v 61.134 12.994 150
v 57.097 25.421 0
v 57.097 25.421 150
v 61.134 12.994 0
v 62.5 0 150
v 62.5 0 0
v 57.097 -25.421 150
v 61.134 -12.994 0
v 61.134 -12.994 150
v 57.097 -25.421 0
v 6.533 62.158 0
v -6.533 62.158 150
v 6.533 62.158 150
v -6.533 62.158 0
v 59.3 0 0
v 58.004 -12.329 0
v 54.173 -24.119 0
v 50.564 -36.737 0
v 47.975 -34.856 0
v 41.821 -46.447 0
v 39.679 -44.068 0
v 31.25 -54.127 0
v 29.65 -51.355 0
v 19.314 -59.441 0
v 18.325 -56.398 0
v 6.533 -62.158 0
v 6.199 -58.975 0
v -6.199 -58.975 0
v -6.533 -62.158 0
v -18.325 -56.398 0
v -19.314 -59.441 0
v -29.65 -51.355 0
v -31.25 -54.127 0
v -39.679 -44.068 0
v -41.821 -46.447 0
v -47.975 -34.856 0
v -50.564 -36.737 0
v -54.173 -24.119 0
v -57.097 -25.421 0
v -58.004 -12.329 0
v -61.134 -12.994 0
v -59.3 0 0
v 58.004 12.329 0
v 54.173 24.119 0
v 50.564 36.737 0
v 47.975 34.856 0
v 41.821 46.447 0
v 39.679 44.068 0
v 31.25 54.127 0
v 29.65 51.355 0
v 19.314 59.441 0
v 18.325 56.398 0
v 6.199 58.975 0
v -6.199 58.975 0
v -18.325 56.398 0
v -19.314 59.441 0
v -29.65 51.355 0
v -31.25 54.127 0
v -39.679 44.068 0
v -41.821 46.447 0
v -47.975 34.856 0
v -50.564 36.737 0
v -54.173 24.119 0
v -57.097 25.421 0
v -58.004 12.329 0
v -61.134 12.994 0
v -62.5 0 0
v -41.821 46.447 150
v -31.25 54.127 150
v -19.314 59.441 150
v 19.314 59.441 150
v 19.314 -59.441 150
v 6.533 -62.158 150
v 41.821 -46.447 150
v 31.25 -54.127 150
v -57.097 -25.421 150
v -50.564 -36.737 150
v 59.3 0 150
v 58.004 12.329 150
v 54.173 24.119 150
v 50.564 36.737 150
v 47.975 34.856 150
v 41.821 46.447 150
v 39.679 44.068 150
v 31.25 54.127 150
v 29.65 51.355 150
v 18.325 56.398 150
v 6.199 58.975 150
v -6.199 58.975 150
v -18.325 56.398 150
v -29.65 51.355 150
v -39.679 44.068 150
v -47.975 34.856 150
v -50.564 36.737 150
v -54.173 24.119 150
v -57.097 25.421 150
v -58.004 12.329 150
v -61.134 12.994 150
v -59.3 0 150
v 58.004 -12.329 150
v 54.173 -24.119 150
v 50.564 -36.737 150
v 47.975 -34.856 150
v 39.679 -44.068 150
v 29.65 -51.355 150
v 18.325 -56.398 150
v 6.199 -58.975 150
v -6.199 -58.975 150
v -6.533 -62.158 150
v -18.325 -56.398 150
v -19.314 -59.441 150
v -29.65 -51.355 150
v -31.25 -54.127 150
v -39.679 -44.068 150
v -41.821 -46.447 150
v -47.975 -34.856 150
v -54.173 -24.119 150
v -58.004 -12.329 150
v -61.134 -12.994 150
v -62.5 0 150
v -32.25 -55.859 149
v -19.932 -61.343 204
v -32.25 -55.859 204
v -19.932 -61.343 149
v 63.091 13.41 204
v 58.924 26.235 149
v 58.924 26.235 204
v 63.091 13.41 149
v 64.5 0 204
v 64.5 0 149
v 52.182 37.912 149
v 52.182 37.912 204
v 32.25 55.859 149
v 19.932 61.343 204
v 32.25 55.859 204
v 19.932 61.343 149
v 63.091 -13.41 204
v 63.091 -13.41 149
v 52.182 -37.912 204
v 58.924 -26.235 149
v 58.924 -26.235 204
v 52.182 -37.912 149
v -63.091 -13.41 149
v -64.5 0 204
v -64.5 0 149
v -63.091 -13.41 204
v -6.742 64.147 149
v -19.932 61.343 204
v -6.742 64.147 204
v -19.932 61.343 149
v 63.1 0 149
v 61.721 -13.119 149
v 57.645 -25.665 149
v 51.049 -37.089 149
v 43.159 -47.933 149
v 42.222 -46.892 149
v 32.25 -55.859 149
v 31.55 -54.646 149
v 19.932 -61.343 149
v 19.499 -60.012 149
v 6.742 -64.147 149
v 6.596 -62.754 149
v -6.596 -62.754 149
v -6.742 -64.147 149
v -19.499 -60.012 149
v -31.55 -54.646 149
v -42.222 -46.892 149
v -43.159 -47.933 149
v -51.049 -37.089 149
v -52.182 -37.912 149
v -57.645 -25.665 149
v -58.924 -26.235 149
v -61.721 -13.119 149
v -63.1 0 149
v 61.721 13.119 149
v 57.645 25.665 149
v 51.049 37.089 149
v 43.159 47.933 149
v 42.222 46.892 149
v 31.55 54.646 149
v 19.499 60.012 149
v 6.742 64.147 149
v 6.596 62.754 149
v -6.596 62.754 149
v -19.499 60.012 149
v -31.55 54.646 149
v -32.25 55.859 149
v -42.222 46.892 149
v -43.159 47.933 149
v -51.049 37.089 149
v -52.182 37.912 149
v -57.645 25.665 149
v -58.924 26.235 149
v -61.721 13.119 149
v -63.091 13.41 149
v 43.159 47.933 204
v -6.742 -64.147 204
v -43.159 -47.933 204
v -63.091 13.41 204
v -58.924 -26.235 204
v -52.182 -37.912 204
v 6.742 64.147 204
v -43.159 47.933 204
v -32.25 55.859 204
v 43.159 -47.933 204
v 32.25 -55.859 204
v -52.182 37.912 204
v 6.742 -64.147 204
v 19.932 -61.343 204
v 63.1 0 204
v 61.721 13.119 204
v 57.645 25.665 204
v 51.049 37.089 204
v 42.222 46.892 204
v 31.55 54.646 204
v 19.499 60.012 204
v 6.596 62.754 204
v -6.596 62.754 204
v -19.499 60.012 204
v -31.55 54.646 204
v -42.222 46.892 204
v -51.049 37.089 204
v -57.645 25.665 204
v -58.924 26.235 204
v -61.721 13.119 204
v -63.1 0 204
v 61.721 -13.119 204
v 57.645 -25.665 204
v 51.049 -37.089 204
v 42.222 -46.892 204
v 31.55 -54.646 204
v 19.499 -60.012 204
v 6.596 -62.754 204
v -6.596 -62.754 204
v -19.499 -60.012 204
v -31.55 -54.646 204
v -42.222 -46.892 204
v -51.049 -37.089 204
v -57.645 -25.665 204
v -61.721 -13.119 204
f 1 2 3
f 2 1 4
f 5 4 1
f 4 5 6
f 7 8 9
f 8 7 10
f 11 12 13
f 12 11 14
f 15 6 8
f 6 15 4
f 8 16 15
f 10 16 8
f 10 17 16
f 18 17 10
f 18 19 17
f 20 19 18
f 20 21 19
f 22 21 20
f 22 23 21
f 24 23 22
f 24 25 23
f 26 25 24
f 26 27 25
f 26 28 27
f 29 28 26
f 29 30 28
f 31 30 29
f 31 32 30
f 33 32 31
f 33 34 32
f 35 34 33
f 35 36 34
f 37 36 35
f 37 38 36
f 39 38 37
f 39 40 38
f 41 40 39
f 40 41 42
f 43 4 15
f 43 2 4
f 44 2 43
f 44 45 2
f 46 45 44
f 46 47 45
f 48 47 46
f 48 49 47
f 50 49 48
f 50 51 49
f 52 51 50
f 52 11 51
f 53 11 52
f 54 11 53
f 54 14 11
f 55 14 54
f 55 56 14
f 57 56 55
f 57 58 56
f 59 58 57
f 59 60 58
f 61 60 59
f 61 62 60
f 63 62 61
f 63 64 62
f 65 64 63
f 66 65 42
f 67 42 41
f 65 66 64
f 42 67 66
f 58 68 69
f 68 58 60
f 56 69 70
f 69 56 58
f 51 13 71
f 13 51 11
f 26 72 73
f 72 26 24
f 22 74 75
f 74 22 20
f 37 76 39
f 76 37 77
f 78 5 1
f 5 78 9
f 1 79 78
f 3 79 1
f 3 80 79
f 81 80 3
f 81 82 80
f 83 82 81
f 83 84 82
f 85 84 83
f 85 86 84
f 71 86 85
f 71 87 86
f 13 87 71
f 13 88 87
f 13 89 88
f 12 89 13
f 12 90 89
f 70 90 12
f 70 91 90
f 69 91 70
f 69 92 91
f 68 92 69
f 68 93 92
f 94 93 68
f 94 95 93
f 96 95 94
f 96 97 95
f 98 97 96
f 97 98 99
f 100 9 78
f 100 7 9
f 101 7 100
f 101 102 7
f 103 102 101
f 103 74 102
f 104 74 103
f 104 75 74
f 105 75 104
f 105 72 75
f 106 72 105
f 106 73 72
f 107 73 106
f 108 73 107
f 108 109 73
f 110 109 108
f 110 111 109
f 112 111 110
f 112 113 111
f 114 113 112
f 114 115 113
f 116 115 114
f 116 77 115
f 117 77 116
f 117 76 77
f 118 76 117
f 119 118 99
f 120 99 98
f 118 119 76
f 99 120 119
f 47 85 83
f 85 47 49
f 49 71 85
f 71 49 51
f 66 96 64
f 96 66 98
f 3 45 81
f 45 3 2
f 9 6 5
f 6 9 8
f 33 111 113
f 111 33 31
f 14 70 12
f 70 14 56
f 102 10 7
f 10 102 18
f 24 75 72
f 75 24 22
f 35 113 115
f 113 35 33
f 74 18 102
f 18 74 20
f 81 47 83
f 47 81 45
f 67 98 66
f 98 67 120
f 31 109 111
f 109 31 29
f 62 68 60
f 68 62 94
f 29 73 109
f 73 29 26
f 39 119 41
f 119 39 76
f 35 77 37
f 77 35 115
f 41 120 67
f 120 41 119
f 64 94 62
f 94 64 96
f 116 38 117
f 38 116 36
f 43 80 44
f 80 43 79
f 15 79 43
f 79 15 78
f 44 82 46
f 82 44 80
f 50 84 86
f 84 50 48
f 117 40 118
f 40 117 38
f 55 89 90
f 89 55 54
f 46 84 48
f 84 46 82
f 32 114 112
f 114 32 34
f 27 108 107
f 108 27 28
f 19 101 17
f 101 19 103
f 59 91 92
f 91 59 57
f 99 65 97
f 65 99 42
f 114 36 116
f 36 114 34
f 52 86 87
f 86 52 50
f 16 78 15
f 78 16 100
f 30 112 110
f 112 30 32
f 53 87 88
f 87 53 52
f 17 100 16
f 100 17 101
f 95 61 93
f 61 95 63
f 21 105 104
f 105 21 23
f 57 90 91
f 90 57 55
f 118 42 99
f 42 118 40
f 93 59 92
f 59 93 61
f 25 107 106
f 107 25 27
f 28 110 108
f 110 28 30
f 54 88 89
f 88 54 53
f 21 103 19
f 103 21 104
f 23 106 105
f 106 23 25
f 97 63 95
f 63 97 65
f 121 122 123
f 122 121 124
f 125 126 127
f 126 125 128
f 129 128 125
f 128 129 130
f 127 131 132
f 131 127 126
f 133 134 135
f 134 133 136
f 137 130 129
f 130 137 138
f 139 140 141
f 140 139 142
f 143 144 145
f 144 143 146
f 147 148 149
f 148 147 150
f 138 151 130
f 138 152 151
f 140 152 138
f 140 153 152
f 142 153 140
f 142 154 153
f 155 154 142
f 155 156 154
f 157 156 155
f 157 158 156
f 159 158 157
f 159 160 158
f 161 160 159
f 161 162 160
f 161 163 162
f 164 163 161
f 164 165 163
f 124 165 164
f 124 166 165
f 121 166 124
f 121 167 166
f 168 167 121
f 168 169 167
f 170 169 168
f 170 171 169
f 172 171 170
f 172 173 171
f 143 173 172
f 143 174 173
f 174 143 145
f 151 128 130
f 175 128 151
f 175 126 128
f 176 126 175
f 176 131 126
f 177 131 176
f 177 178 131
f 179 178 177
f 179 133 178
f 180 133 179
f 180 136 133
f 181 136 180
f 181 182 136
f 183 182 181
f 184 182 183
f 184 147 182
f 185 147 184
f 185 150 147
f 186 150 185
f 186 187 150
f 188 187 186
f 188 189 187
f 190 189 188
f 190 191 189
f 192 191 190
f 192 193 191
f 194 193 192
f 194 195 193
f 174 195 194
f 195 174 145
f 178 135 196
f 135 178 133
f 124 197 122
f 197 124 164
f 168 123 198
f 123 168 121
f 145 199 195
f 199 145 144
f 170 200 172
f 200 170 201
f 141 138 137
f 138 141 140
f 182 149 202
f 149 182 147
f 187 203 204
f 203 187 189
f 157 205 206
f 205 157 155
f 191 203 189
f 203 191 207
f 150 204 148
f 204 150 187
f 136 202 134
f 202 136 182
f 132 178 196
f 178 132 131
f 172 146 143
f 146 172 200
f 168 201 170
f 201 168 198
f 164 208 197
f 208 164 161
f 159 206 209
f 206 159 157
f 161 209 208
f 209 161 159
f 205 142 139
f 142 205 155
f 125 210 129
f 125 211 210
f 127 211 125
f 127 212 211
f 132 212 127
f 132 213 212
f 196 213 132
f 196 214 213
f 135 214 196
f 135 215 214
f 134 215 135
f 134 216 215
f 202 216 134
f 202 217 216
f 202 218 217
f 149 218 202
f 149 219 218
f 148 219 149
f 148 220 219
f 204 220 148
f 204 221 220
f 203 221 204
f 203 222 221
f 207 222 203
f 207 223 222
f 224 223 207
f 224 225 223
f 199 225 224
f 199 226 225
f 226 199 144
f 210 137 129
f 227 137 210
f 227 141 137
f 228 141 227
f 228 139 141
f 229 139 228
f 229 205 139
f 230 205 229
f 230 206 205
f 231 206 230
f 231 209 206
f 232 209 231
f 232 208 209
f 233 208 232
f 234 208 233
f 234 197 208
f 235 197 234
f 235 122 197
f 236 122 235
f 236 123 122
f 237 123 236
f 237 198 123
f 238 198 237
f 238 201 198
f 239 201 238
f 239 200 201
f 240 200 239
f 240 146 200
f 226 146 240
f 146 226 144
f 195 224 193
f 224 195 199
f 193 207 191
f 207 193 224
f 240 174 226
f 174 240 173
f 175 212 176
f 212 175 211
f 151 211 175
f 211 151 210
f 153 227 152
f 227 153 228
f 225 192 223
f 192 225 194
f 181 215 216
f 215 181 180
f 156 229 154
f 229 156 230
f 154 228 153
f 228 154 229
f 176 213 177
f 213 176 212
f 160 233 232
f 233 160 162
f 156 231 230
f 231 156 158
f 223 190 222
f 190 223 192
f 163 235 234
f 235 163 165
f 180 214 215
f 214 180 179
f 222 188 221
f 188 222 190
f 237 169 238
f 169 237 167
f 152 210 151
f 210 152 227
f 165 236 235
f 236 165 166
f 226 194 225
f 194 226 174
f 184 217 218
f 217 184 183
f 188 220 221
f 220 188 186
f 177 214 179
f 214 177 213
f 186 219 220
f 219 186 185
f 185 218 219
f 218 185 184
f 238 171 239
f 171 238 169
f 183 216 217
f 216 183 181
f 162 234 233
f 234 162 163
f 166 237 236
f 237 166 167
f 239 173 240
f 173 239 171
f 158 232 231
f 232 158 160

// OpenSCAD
// Parameters
pipe_standard = 1; //[1:1:1]
nominal_diameter = 125; //[63:250:1]
length_mm = 150; //[75:300:1]
include_end_fitting = 1; //[0:1:1]
pipe_od = 125; //[63:250:1]
pipe_wall = 3.2; //[1.6:6.4:0.1]
socket_length = 55; //[30:110:1]
socket_wall_extra = 2.0; //[1.0:4.0:0.1]
socket_clearance = 0.6; //[0.2:1.2:0.1]
overlap = 1.0; //[0.5:2.0:0.1]

// HT Pipe - complete geometry
module ht_pipe() {
  color([0.85, 0.85, 0.8]) { // PVC color
    // Pipe segment
    difference() {
      cylinder(h=length_mm, r=pipe_od/2, center=false);
      translate([0, 0, 0])
        cylinder(h=length_mm, r=pipe_od/2 - pipe_wall, center=false);
    }
    
    // Integrated socket fitting
    if (include_end_fitting) {
      difference() {
        translate([0, 0, length_mm - overlap])
          cylinder(h=socket_length, r=pipe_od/2 + socket_wall_extra, center=false);
        translate([0, 0, length_mm - overlap])
          cylinder(h=socket_length, r=pipe_od/2 + socket_clearance, center=false);
      }
    }
  }
}

// Assembly
module assembly() {
  ht_pipe();
}

assembly();
